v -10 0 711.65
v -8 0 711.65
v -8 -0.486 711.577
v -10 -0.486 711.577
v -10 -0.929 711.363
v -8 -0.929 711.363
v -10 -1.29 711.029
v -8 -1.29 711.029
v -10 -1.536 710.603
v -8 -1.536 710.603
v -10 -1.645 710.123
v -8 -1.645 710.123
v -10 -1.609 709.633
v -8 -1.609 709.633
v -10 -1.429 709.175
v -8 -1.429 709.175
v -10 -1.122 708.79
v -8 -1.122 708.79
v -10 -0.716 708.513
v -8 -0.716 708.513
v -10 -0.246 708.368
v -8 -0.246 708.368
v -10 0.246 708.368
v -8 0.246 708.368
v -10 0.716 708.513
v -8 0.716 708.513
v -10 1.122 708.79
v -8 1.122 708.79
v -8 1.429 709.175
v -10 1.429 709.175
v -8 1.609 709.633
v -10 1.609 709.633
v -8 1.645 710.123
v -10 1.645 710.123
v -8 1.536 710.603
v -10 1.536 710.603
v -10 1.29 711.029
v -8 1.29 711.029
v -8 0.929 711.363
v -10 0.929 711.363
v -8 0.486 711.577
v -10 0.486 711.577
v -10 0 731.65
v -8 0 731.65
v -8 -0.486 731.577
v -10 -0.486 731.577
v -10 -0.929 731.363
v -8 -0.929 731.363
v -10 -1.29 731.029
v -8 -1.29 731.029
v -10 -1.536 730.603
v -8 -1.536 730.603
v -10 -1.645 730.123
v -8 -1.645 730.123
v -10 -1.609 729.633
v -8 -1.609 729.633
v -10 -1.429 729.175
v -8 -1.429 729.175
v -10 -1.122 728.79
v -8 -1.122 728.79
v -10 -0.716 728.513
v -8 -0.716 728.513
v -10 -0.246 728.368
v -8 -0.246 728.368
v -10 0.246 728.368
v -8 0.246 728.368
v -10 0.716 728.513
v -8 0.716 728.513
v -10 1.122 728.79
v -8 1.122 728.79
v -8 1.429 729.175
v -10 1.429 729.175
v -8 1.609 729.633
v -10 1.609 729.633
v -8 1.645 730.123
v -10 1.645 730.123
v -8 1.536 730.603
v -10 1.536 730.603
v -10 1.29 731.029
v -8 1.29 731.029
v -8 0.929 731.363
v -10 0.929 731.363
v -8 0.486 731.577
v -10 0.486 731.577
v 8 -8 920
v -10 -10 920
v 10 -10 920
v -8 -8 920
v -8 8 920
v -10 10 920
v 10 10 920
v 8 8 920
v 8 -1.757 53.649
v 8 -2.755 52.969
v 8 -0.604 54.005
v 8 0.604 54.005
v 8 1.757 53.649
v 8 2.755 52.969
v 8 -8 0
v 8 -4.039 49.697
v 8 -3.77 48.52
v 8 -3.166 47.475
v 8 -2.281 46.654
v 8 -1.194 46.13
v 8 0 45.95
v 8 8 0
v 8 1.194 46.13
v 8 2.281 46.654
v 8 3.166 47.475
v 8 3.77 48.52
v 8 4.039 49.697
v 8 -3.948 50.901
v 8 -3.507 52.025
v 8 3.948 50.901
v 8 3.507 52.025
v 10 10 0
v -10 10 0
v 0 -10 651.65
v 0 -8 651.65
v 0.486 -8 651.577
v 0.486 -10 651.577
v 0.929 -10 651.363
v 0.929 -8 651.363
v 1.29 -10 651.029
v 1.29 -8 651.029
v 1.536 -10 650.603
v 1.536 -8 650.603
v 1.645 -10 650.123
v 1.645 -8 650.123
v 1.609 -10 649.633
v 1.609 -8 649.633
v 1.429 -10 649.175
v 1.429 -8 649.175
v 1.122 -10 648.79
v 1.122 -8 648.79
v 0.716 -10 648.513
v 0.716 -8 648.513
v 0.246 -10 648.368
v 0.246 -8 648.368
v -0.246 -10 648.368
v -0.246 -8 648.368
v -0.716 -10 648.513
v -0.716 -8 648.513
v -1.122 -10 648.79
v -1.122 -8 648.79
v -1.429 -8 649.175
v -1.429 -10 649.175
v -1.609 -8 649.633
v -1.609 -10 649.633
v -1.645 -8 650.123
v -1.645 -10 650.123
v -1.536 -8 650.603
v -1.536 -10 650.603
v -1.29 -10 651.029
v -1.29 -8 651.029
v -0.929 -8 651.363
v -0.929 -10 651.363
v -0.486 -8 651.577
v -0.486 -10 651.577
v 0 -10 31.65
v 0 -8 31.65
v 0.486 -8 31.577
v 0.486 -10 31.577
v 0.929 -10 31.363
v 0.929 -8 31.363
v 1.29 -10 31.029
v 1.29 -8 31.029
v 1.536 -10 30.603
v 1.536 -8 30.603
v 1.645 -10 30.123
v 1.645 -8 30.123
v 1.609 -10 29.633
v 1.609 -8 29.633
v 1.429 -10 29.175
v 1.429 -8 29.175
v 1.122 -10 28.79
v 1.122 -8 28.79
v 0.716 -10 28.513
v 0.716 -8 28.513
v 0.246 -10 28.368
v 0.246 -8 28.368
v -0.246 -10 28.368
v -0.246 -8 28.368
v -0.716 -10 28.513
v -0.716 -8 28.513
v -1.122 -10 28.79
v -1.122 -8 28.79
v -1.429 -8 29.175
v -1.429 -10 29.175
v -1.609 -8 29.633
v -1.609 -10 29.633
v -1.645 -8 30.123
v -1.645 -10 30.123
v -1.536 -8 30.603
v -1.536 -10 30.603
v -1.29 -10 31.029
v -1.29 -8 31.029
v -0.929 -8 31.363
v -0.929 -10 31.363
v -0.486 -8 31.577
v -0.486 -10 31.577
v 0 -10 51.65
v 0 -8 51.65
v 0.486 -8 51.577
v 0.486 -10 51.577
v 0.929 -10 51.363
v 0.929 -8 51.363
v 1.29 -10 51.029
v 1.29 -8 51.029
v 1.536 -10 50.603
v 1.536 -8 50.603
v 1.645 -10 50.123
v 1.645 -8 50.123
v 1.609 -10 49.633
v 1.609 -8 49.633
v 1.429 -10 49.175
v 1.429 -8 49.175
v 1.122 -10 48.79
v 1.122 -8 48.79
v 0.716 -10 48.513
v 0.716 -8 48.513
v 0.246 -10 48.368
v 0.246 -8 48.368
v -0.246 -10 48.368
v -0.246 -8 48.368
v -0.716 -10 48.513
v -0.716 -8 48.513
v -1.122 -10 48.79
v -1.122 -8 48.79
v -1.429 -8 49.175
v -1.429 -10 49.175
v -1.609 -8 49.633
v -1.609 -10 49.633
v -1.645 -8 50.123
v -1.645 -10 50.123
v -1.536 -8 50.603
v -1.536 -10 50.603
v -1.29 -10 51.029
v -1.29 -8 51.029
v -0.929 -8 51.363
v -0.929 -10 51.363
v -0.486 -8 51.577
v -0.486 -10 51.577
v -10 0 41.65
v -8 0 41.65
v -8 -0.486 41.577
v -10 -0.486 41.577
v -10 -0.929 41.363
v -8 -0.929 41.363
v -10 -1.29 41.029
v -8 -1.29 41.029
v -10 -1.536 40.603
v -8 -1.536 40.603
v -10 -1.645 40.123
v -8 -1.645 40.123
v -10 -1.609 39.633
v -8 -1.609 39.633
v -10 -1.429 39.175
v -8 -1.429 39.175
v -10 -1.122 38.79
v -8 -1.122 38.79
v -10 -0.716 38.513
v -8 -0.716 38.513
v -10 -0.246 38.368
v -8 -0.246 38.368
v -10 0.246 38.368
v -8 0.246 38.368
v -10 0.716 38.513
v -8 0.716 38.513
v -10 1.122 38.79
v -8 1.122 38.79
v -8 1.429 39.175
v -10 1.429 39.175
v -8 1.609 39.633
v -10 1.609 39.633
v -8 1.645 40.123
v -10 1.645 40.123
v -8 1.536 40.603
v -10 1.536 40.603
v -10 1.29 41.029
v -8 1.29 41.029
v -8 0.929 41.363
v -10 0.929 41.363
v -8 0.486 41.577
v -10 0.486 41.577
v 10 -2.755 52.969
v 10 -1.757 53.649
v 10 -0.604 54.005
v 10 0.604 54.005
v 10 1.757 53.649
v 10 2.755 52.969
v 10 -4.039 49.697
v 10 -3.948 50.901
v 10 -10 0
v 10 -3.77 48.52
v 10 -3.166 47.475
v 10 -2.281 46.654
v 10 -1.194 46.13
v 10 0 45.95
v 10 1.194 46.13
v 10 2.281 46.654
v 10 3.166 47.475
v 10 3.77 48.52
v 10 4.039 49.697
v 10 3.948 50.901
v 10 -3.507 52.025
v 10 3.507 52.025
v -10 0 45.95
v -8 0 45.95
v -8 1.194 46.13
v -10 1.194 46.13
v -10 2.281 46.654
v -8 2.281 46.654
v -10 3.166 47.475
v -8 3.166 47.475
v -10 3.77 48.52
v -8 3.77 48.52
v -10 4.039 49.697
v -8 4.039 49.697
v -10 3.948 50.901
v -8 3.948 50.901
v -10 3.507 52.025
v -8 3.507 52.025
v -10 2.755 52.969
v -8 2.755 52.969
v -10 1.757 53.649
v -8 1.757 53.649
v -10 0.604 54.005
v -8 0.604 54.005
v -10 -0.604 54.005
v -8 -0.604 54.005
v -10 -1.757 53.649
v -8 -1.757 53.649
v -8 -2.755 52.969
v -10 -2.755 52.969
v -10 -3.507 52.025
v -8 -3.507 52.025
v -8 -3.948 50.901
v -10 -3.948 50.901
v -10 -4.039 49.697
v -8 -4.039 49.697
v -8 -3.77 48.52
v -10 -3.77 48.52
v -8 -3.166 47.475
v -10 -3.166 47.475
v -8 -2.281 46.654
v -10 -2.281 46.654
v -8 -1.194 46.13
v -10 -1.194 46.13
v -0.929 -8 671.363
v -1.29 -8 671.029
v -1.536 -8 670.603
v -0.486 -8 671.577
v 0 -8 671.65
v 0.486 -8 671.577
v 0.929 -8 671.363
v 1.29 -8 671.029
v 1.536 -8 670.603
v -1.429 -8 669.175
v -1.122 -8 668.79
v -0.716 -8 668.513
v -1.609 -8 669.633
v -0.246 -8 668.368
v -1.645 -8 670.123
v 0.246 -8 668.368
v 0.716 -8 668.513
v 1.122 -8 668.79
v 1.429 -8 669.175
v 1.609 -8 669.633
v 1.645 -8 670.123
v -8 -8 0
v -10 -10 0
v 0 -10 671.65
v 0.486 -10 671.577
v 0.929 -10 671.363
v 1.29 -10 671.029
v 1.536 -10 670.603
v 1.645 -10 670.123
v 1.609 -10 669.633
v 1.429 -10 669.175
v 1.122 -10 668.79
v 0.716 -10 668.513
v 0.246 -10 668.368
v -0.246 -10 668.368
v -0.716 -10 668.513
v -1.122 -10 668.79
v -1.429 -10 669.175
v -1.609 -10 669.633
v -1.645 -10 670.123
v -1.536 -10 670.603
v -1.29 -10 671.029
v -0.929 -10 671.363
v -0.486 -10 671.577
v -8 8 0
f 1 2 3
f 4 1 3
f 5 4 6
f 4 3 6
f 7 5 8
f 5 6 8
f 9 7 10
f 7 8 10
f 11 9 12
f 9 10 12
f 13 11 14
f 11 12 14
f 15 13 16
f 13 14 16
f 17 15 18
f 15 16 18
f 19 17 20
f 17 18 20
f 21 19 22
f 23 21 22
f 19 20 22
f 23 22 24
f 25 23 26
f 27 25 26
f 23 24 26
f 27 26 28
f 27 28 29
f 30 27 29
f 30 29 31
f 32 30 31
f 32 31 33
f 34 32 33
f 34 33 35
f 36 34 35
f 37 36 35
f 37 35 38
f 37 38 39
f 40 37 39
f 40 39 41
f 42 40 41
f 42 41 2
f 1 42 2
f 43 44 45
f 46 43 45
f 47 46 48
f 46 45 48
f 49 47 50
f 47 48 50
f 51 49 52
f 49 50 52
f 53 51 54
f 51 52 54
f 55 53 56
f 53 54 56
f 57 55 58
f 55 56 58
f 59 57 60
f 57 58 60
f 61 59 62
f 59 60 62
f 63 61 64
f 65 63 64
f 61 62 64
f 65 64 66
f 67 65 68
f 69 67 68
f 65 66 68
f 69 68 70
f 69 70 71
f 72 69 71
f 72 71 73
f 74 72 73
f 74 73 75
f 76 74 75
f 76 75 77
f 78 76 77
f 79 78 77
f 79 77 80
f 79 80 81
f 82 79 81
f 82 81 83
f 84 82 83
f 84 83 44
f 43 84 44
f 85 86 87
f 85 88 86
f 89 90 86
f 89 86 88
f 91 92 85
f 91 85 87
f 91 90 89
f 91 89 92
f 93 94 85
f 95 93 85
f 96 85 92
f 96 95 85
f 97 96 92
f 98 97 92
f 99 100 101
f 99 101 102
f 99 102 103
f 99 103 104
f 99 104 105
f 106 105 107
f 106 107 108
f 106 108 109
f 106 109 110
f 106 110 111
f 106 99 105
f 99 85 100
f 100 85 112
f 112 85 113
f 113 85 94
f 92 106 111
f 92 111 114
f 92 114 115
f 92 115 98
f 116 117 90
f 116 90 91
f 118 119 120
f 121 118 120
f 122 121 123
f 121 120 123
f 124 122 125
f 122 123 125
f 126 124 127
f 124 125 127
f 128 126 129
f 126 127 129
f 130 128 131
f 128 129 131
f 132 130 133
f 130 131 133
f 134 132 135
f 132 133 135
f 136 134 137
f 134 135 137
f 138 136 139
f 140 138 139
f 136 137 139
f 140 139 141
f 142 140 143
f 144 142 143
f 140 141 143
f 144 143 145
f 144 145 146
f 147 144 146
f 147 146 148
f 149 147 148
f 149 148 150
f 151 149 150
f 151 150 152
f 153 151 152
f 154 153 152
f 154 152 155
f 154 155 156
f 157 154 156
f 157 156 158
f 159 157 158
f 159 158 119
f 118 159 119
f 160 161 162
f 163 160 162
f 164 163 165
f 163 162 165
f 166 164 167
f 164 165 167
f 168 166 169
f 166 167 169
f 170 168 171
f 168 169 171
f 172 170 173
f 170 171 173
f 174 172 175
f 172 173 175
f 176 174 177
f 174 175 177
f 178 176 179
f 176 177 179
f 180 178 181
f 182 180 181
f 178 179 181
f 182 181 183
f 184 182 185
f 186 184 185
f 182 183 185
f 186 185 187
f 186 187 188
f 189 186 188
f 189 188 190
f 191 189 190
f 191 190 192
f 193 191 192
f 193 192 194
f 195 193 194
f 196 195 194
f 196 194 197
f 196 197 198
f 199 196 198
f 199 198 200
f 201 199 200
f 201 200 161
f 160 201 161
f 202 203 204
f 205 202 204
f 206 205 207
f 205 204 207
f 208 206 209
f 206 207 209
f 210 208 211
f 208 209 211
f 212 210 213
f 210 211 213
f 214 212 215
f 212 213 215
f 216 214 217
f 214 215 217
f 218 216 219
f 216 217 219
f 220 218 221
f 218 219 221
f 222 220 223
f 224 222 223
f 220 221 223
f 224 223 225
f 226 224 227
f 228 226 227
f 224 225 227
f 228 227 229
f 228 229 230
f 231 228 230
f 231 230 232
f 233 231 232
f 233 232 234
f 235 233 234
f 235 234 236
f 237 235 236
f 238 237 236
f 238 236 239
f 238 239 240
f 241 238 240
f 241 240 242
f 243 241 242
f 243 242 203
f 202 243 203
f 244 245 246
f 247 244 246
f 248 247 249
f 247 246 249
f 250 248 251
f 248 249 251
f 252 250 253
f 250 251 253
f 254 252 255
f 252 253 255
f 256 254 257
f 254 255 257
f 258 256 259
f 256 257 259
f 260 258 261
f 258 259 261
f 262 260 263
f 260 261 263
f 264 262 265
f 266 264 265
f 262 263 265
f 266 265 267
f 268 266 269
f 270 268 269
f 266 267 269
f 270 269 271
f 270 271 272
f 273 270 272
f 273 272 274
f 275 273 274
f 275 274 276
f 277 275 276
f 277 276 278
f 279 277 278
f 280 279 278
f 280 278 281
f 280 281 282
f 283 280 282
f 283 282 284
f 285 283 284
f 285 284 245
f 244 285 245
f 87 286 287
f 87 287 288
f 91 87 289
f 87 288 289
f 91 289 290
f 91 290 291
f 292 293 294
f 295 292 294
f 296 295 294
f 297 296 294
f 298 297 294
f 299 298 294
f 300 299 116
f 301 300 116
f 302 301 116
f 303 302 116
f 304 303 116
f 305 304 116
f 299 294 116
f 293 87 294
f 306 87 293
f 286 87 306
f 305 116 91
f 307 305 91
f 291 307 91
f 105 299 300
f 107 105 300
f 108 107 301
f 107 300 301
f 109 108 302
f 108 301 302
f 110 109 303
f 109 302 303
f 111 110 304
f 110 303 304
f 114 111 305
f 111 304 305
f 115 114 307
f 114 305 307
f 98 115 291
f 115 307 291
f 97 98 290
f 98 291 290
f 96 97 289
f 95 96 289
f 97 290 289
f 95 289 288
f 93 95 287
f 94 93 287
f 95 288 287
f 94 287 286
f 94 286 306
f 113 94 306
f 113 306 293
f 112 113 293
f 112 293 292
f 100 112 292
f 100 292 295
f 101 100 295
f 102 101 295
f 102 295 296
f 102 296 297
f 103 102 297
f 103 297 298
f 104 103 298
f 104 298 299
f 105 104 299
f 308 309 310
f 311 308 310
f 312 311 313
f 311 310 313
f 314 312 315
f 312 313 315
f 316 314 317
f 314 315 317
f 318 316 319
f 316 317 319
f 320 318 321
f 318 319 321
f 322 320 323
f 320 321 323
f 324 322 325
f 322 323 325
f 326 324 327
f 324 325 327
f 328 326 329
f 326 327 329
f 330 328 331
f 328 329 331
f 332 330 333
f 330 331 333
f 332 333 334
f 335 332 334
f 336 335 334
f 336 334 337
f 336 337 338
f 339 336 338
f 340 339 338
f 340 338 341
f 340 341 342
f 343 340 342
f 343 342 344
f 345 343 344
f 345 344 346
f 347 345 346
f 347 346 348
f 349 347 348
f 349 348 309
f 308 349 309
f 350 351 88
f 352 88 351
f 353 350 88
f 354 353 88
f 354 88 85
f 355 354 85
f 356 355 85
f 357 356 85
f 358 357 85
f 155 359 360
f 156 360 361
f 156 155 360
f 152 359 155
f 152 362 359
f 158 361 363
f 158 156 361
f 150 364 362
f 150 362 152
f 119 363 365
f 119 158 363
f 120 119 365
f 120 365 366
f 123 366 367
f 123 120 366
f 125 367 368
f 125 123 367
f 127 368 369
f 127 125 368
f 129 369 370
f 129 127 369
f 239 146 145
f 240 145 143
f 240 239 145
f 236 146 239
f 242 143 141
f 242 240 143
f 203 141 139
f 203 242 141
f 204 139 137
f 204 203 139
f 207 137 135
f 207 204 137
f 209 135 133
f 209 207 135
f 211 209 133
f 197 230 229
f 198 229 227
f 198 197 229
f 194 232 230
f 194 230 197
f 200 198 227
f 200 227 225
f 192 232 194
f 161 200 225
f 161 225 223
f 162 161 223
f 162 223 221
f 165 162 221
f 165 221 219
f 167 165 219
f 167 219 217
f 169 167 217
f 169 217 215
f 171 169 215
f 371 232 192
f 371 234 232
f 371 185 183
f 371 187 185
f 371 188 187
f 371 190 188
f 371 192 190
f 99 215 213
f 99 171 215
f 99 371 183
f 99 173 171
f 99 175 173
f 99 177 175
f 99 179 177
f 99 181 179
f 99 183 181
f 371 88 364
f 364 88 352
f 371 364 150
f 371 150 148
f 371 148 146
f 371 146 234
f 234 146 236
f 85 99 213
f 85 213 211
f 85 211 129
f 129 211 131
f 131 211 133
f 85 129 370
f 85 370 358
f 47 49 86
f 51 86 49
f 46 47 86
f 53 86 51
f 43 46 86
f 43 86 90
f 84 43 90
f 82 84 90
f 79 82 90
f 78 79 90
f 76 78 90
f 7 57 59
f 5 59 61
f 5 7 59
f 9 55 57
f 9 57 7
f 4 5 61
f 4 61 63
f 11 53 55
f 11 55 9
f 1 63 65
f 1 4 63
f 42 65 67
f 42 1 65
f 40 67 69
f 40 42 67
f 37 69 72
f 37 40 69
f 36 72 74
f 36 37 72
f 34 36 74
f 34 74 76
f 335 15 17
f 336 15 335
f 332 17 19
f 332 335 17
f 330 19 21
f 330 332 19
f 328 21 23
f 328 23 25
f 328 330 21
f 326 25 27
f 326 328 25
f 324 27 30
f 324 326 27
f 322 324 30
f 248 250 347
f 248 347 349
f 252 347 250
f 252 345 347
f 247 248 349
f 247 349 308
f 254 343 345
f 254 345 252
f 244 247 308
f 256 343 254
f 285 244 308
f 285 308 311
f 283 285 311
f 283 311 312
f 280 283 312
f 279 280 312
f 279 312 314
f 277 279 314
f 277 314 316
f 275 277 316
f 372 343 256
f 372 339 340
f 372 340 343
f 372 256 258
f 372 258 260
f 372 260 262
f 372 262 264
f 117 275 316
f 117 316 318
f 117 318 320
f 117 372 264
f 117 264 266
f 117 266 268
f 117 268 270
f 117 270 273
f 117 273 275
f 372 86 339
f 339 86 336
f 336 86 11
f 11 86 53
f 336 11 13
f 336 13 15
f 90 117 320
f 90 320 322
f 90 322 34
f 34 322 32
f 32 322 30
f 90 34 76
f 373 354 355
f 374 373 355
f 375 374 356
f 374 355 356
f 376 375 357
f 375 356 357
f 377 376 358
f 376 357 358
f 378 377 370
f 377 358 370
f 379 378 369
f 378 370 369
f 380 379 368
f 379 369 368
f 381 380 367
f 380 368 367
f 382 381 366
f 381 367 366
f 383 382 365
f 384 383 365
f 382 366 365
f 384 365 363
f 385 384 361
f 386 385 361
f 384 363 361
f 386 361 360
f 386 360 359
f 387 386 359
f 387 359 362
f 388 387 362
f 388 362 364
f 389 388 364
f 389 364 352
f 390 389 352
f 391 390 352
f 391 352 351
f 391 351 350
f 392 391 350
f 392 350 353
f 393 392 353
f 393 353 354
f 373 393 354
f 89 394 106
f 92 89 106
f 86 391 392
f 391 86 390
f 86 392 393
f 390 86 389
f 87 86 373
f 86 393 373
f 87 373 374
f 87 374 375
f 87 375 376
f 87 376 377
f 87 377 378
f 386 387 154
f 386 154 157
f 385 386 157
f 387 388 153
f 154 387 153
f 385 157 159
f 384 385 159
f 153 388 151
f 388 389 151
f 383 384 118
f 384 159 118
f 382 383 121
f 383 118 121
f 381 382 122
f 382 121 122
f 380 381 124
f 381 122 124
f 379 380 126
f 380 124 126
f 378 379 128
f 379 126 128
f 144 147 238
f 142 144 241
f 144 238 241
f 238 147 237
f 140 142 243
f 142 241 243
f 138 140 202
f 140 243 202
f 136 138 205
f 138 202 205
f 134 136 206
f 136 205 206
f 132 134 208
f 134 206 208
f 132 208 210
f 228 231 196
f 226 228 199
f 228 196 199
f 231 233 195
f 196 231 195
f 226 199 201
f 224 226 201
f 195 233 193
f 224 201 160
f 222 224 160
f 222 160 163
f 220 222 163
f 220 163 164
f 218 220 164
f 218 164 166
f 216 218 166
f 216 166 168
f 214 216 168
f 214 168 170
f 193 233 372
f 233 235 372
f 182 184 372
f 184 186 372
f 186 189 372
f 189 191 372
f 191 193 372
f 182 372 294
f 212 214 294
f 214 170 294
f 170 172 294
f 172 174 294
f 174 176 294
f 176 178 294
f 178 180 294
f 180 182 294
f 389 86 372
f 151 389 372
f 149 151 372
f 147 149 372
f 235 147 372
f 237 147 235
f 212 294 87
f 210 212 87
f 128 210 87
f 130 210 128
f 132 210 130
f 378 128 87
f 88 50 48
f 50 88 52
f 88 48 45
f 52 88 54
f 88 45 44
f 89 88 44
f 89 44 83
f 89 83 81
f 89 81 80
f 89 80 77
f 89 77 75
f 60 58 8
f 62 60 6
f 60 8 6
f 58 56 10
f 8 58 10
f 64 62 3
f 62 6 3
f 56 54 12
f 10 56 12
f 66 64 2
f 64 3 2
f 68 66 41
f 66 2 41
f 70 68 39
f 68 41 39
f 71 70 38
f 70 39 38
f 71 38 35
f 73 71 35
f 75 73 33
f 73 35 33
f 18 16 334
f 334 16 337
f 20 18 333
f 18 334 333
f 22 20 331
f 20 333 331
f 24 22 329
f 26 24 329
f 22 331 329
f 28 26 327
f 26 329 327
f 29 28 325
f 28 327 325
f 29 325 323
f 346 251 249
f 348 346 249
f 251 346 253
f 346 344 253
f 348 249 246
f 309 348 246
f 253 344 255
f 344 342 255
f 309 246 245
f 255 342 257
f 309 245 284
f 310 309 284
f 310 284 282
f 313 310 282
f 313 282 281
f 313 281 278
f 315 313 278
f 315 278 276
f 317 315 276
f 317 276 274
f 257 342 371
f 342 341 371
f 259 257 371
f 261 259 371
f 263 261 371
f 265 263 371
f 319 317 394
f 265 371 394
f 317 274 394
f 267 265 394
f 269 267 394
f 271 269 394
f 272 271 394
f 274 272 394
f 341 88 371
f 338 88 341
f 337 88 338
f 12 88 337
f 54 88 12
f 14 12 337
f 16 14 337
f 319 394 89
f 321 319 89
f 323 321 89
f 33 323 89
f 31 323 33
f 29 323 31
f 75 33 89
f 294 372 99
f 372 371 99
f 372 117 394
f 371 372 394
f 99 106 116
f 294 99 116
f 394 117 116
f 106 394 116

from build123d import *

# Parameters (mm, degrees)
SKETCH_1_W               = 20
SKETCH_1_H               = 20
SKETCH_1_W_2             = 16
SKETCH_1_H_2             = 16
EXTRUDE_1_DEPTH          = 970
SKETCH_2_R               = 4.05
CUT_EXTRUDE_1_DEPTH      = 970
SKETCH_4_W               = 21.376287738
SKETCH_4_H               = 29.089038522
CUT_EXTRUDE_3_DEPTH      = 50
SKETCH_6_R               = 1
CUT_EXTRUDE_5_DEPTH      = 10
M4X0_7_1_D               = 3.3
M4X0_7_1_DEPTH           = 5
M4X0_7_1_TIP             = 0.991420021
SKETCH_10_R              = 1
CUT_EXTRUDE_6_DEPTH      = 5
M4X0_7_4_D               = 3.3
M4X0_7_4_DEPTH           = 5
M4X0_7_4_TIP             = 0.991420021
M4X0_7_4_ON_FACE_2_D     = 3.3
M4X0_7_4_ON_FACE_2_DEPTH = 5
M4X0_7_4_ON_FACE_2_TIP   = 0.991420021
SKETCH_12_R              = 1
CUT_EXTRUDE_7_DEPTH      = 5
M4X0_7_5_D               = 3.3
M4X0_7_5_DEPTH           = 9
M4X0_7_5_TIP             = 0.991420021
M4X0_7_5_ON_FACE_2_D     = 3.3
M4X0_7_5_ON_FACE_2_DEPTH = 9
M4X0_7_5_ON_FACE_2_TIP   = 0.991420021


with BuildPart() as part:
    # ｽｹｯﾁ1 → ﾎﾞｽ - 押し出し1 (new body)
    with BuildSketch(Plane.XY):
        Rectangle(SKETCH_1_W, SKETCH_1_H)
        Rectangle(SKETCH_1_W_2, SKETCH_1_H_2, mode=Mode.SUBTRACT)
    extrude(amount=EXTRUDE_1_DEPTH)

    # ｽｹｯﾁ2 → ｶｯﾄ - 押し出し1 (cut)
    with BuildSketch(Plane(origin=(10, 0, 0), x_dir=(0, 0, -1), z_dir=(1, 0, 0))):
        with Locations((-50, 0)):
            Circle(SKETCH_2_R)
    extrude(amount=-CUT_EXTRUDE_1_DEPTH, mode=Mode.SUBTRACT)

    # ｽｹｯﾁ4 → ｶｯﾄ - 押し出し3 (cut)
    with BuildSketch(Plane.XY.offset(970)):
        Rectangle(SKETCH_4_W, SKETCH_4_H)
    extrude(amount=-CUT_EXTRUDE_3_DEPTH, mode=Mode.SUBTRACT)

    # ｽｹｯﾁ6 → ｶｯﾄ - 押し出し5 (cut)
    with BuildSketch(Plane.XZ.offset(10)):
        with Locations((0, 30)):
            Circle(SKETCH_6_R)
        with Locations((0, 50)):
            Circle(SKETCH_6_R)
    extrude(amount=-CUT_EXTRUDE_5_DEPTH, mode=Mode.SUBTRACT)

    # M4x0.7 ねじ穴1
    with Locations(Plane(origin=(0, -10, 30), x_dir=(0, 0, -1), z_dir=(0, -1, 0))):
        with Locations((0, 0), (-20, 0)):
            Hole(M4X0_7_1_D / 2, depth=M4X0_7_1_DEPTH)
            with Locations((0, 0, -(M4X0_7_1_DEPTH + M4X0_7_1_TIP / 2))):  # 118° drill point
                Cone(0, M4X0_7_1_D / 2, M4X0_7_1_TIP, mode=Mode.SUBTRACT)

    # ｽｹｯﾁ10 → ｶｯﾄ - 押し出し6 (cut)
    with BuildSketch(Plane(origin=(0, -10, 0), x_dir=(-1, 0, 0), z_dir=(0, -1, 0))):
        with Locations((0, -670)):
            Circle(SKETCH_10_R)
        with Locations((0, -650)):
            Circle(SKETCH_10_R)
    extrude(amount=-CUT_EXTRUDE_6_DEPTH, mode=Mode.SUBTRACT)

    # M4x0.7 ねじ穴4
    with Locations(Plane(origin=(0, -10, 650), x_dir=(0, 0, -1), z_dir=(0, -1, 0))):
        with Locations((0, 0)):
            Hole(M4X0_7_4_D / 2, depth=M4X0_7_4_DEPTH)
            with Locations((0, 0, -(M4X0_7_4_DEPTH + M4X0_7_4_TIP / 2))):  # 118° drill point
                Cone(0, M4X0_7_4_D / 2, M4X0_7_4_TIP, mode=Mode.SUBTRACT)

    # M4x0.7 ねじ穴4 on face 2
    with Locations(Plane(origin=(0, -8, 670), x_dir=(0, 0, -1), z_dir=(0, -1, 0))):
        with Locations((0, 0)):
            Hole(M4X0_7_4_ON_FACE_2_D / 2, depth=M4X0_7_4_ON_FACE_2_DEPTH)
            with Locations((0, 0, -(M4X0_7_4_ON_FACE_2_DEPTH + M4X0_7_4_ON_FACE_2_TIP / 2))):  # 118° drill point
                Cone(0, M4X0_7_4_ON_FACE_2_D / 2, M4X0_7_4_ON_FACE_2_TIP, mode=Mode.SUBTRACT)

    # ｽｹｯﾁ12 → ｶｯﾄ - 押し出し7 (cut)
    with BuildSketch(Plane.ZY.offset(10)):
        with Locations((710, 0)):
            Circle(SKETCH_12_R)
        with Locations((730, 0)):
            Circle(SKETCH_12_R)
        with Locations((40, 0)):
            Circle(SKETCH_12_R)
    extrude(amount=-CUT_EXTRUDE_7_DEPTH, mode=Mode.SUBTRACT)

    # M4x0.7 ねじ穴5
    with Locations(Plane(origin=(-10, 0, 730), x_dir=(0, 0, -1), z_dir=(-1, 0, 0))):
        with Locations((0, 0), (20, 0)):
            Hole(M4X0_7_5_D / 2, depth=M4X0_7_5_DEPTH)
            with Locations((0, 0, -(M4X0_7_5_DEPTH + M4X0_7_5_TIP / 2))):  # 118° drill point
                Cone(0, M4X0_7_5_D / 2, M4X0_7_5_TIP, mode=Mode.SUBTRACT)

    # M4x0.7 ねじ穴5 on face 2
    with Locations(Plane(origin=(-8, 0, 40), x_dir=(0, 0, -1), z_dir=(-1, 0, 0))):
        with Locations((0, 0)):
            Hole(M4X0_7_5_ON_FACE_2_D / 2, depth=M4X0_7_5_ON_FACE_2_DEPTH)
            with Locations((0, 0, -(M4X0_7_5_ON_FACE_2_DEPTH + M4X0_7_5_ON_FACE_2_TIP / 2))):  # 118° drill point
                Cone(0, M4X0_7_5_ON_FACE_2_D / 2, M4X0_7_5_ON_FACE_2_TIP, mode=Mode.SUBTRACT)


solid = part.part
